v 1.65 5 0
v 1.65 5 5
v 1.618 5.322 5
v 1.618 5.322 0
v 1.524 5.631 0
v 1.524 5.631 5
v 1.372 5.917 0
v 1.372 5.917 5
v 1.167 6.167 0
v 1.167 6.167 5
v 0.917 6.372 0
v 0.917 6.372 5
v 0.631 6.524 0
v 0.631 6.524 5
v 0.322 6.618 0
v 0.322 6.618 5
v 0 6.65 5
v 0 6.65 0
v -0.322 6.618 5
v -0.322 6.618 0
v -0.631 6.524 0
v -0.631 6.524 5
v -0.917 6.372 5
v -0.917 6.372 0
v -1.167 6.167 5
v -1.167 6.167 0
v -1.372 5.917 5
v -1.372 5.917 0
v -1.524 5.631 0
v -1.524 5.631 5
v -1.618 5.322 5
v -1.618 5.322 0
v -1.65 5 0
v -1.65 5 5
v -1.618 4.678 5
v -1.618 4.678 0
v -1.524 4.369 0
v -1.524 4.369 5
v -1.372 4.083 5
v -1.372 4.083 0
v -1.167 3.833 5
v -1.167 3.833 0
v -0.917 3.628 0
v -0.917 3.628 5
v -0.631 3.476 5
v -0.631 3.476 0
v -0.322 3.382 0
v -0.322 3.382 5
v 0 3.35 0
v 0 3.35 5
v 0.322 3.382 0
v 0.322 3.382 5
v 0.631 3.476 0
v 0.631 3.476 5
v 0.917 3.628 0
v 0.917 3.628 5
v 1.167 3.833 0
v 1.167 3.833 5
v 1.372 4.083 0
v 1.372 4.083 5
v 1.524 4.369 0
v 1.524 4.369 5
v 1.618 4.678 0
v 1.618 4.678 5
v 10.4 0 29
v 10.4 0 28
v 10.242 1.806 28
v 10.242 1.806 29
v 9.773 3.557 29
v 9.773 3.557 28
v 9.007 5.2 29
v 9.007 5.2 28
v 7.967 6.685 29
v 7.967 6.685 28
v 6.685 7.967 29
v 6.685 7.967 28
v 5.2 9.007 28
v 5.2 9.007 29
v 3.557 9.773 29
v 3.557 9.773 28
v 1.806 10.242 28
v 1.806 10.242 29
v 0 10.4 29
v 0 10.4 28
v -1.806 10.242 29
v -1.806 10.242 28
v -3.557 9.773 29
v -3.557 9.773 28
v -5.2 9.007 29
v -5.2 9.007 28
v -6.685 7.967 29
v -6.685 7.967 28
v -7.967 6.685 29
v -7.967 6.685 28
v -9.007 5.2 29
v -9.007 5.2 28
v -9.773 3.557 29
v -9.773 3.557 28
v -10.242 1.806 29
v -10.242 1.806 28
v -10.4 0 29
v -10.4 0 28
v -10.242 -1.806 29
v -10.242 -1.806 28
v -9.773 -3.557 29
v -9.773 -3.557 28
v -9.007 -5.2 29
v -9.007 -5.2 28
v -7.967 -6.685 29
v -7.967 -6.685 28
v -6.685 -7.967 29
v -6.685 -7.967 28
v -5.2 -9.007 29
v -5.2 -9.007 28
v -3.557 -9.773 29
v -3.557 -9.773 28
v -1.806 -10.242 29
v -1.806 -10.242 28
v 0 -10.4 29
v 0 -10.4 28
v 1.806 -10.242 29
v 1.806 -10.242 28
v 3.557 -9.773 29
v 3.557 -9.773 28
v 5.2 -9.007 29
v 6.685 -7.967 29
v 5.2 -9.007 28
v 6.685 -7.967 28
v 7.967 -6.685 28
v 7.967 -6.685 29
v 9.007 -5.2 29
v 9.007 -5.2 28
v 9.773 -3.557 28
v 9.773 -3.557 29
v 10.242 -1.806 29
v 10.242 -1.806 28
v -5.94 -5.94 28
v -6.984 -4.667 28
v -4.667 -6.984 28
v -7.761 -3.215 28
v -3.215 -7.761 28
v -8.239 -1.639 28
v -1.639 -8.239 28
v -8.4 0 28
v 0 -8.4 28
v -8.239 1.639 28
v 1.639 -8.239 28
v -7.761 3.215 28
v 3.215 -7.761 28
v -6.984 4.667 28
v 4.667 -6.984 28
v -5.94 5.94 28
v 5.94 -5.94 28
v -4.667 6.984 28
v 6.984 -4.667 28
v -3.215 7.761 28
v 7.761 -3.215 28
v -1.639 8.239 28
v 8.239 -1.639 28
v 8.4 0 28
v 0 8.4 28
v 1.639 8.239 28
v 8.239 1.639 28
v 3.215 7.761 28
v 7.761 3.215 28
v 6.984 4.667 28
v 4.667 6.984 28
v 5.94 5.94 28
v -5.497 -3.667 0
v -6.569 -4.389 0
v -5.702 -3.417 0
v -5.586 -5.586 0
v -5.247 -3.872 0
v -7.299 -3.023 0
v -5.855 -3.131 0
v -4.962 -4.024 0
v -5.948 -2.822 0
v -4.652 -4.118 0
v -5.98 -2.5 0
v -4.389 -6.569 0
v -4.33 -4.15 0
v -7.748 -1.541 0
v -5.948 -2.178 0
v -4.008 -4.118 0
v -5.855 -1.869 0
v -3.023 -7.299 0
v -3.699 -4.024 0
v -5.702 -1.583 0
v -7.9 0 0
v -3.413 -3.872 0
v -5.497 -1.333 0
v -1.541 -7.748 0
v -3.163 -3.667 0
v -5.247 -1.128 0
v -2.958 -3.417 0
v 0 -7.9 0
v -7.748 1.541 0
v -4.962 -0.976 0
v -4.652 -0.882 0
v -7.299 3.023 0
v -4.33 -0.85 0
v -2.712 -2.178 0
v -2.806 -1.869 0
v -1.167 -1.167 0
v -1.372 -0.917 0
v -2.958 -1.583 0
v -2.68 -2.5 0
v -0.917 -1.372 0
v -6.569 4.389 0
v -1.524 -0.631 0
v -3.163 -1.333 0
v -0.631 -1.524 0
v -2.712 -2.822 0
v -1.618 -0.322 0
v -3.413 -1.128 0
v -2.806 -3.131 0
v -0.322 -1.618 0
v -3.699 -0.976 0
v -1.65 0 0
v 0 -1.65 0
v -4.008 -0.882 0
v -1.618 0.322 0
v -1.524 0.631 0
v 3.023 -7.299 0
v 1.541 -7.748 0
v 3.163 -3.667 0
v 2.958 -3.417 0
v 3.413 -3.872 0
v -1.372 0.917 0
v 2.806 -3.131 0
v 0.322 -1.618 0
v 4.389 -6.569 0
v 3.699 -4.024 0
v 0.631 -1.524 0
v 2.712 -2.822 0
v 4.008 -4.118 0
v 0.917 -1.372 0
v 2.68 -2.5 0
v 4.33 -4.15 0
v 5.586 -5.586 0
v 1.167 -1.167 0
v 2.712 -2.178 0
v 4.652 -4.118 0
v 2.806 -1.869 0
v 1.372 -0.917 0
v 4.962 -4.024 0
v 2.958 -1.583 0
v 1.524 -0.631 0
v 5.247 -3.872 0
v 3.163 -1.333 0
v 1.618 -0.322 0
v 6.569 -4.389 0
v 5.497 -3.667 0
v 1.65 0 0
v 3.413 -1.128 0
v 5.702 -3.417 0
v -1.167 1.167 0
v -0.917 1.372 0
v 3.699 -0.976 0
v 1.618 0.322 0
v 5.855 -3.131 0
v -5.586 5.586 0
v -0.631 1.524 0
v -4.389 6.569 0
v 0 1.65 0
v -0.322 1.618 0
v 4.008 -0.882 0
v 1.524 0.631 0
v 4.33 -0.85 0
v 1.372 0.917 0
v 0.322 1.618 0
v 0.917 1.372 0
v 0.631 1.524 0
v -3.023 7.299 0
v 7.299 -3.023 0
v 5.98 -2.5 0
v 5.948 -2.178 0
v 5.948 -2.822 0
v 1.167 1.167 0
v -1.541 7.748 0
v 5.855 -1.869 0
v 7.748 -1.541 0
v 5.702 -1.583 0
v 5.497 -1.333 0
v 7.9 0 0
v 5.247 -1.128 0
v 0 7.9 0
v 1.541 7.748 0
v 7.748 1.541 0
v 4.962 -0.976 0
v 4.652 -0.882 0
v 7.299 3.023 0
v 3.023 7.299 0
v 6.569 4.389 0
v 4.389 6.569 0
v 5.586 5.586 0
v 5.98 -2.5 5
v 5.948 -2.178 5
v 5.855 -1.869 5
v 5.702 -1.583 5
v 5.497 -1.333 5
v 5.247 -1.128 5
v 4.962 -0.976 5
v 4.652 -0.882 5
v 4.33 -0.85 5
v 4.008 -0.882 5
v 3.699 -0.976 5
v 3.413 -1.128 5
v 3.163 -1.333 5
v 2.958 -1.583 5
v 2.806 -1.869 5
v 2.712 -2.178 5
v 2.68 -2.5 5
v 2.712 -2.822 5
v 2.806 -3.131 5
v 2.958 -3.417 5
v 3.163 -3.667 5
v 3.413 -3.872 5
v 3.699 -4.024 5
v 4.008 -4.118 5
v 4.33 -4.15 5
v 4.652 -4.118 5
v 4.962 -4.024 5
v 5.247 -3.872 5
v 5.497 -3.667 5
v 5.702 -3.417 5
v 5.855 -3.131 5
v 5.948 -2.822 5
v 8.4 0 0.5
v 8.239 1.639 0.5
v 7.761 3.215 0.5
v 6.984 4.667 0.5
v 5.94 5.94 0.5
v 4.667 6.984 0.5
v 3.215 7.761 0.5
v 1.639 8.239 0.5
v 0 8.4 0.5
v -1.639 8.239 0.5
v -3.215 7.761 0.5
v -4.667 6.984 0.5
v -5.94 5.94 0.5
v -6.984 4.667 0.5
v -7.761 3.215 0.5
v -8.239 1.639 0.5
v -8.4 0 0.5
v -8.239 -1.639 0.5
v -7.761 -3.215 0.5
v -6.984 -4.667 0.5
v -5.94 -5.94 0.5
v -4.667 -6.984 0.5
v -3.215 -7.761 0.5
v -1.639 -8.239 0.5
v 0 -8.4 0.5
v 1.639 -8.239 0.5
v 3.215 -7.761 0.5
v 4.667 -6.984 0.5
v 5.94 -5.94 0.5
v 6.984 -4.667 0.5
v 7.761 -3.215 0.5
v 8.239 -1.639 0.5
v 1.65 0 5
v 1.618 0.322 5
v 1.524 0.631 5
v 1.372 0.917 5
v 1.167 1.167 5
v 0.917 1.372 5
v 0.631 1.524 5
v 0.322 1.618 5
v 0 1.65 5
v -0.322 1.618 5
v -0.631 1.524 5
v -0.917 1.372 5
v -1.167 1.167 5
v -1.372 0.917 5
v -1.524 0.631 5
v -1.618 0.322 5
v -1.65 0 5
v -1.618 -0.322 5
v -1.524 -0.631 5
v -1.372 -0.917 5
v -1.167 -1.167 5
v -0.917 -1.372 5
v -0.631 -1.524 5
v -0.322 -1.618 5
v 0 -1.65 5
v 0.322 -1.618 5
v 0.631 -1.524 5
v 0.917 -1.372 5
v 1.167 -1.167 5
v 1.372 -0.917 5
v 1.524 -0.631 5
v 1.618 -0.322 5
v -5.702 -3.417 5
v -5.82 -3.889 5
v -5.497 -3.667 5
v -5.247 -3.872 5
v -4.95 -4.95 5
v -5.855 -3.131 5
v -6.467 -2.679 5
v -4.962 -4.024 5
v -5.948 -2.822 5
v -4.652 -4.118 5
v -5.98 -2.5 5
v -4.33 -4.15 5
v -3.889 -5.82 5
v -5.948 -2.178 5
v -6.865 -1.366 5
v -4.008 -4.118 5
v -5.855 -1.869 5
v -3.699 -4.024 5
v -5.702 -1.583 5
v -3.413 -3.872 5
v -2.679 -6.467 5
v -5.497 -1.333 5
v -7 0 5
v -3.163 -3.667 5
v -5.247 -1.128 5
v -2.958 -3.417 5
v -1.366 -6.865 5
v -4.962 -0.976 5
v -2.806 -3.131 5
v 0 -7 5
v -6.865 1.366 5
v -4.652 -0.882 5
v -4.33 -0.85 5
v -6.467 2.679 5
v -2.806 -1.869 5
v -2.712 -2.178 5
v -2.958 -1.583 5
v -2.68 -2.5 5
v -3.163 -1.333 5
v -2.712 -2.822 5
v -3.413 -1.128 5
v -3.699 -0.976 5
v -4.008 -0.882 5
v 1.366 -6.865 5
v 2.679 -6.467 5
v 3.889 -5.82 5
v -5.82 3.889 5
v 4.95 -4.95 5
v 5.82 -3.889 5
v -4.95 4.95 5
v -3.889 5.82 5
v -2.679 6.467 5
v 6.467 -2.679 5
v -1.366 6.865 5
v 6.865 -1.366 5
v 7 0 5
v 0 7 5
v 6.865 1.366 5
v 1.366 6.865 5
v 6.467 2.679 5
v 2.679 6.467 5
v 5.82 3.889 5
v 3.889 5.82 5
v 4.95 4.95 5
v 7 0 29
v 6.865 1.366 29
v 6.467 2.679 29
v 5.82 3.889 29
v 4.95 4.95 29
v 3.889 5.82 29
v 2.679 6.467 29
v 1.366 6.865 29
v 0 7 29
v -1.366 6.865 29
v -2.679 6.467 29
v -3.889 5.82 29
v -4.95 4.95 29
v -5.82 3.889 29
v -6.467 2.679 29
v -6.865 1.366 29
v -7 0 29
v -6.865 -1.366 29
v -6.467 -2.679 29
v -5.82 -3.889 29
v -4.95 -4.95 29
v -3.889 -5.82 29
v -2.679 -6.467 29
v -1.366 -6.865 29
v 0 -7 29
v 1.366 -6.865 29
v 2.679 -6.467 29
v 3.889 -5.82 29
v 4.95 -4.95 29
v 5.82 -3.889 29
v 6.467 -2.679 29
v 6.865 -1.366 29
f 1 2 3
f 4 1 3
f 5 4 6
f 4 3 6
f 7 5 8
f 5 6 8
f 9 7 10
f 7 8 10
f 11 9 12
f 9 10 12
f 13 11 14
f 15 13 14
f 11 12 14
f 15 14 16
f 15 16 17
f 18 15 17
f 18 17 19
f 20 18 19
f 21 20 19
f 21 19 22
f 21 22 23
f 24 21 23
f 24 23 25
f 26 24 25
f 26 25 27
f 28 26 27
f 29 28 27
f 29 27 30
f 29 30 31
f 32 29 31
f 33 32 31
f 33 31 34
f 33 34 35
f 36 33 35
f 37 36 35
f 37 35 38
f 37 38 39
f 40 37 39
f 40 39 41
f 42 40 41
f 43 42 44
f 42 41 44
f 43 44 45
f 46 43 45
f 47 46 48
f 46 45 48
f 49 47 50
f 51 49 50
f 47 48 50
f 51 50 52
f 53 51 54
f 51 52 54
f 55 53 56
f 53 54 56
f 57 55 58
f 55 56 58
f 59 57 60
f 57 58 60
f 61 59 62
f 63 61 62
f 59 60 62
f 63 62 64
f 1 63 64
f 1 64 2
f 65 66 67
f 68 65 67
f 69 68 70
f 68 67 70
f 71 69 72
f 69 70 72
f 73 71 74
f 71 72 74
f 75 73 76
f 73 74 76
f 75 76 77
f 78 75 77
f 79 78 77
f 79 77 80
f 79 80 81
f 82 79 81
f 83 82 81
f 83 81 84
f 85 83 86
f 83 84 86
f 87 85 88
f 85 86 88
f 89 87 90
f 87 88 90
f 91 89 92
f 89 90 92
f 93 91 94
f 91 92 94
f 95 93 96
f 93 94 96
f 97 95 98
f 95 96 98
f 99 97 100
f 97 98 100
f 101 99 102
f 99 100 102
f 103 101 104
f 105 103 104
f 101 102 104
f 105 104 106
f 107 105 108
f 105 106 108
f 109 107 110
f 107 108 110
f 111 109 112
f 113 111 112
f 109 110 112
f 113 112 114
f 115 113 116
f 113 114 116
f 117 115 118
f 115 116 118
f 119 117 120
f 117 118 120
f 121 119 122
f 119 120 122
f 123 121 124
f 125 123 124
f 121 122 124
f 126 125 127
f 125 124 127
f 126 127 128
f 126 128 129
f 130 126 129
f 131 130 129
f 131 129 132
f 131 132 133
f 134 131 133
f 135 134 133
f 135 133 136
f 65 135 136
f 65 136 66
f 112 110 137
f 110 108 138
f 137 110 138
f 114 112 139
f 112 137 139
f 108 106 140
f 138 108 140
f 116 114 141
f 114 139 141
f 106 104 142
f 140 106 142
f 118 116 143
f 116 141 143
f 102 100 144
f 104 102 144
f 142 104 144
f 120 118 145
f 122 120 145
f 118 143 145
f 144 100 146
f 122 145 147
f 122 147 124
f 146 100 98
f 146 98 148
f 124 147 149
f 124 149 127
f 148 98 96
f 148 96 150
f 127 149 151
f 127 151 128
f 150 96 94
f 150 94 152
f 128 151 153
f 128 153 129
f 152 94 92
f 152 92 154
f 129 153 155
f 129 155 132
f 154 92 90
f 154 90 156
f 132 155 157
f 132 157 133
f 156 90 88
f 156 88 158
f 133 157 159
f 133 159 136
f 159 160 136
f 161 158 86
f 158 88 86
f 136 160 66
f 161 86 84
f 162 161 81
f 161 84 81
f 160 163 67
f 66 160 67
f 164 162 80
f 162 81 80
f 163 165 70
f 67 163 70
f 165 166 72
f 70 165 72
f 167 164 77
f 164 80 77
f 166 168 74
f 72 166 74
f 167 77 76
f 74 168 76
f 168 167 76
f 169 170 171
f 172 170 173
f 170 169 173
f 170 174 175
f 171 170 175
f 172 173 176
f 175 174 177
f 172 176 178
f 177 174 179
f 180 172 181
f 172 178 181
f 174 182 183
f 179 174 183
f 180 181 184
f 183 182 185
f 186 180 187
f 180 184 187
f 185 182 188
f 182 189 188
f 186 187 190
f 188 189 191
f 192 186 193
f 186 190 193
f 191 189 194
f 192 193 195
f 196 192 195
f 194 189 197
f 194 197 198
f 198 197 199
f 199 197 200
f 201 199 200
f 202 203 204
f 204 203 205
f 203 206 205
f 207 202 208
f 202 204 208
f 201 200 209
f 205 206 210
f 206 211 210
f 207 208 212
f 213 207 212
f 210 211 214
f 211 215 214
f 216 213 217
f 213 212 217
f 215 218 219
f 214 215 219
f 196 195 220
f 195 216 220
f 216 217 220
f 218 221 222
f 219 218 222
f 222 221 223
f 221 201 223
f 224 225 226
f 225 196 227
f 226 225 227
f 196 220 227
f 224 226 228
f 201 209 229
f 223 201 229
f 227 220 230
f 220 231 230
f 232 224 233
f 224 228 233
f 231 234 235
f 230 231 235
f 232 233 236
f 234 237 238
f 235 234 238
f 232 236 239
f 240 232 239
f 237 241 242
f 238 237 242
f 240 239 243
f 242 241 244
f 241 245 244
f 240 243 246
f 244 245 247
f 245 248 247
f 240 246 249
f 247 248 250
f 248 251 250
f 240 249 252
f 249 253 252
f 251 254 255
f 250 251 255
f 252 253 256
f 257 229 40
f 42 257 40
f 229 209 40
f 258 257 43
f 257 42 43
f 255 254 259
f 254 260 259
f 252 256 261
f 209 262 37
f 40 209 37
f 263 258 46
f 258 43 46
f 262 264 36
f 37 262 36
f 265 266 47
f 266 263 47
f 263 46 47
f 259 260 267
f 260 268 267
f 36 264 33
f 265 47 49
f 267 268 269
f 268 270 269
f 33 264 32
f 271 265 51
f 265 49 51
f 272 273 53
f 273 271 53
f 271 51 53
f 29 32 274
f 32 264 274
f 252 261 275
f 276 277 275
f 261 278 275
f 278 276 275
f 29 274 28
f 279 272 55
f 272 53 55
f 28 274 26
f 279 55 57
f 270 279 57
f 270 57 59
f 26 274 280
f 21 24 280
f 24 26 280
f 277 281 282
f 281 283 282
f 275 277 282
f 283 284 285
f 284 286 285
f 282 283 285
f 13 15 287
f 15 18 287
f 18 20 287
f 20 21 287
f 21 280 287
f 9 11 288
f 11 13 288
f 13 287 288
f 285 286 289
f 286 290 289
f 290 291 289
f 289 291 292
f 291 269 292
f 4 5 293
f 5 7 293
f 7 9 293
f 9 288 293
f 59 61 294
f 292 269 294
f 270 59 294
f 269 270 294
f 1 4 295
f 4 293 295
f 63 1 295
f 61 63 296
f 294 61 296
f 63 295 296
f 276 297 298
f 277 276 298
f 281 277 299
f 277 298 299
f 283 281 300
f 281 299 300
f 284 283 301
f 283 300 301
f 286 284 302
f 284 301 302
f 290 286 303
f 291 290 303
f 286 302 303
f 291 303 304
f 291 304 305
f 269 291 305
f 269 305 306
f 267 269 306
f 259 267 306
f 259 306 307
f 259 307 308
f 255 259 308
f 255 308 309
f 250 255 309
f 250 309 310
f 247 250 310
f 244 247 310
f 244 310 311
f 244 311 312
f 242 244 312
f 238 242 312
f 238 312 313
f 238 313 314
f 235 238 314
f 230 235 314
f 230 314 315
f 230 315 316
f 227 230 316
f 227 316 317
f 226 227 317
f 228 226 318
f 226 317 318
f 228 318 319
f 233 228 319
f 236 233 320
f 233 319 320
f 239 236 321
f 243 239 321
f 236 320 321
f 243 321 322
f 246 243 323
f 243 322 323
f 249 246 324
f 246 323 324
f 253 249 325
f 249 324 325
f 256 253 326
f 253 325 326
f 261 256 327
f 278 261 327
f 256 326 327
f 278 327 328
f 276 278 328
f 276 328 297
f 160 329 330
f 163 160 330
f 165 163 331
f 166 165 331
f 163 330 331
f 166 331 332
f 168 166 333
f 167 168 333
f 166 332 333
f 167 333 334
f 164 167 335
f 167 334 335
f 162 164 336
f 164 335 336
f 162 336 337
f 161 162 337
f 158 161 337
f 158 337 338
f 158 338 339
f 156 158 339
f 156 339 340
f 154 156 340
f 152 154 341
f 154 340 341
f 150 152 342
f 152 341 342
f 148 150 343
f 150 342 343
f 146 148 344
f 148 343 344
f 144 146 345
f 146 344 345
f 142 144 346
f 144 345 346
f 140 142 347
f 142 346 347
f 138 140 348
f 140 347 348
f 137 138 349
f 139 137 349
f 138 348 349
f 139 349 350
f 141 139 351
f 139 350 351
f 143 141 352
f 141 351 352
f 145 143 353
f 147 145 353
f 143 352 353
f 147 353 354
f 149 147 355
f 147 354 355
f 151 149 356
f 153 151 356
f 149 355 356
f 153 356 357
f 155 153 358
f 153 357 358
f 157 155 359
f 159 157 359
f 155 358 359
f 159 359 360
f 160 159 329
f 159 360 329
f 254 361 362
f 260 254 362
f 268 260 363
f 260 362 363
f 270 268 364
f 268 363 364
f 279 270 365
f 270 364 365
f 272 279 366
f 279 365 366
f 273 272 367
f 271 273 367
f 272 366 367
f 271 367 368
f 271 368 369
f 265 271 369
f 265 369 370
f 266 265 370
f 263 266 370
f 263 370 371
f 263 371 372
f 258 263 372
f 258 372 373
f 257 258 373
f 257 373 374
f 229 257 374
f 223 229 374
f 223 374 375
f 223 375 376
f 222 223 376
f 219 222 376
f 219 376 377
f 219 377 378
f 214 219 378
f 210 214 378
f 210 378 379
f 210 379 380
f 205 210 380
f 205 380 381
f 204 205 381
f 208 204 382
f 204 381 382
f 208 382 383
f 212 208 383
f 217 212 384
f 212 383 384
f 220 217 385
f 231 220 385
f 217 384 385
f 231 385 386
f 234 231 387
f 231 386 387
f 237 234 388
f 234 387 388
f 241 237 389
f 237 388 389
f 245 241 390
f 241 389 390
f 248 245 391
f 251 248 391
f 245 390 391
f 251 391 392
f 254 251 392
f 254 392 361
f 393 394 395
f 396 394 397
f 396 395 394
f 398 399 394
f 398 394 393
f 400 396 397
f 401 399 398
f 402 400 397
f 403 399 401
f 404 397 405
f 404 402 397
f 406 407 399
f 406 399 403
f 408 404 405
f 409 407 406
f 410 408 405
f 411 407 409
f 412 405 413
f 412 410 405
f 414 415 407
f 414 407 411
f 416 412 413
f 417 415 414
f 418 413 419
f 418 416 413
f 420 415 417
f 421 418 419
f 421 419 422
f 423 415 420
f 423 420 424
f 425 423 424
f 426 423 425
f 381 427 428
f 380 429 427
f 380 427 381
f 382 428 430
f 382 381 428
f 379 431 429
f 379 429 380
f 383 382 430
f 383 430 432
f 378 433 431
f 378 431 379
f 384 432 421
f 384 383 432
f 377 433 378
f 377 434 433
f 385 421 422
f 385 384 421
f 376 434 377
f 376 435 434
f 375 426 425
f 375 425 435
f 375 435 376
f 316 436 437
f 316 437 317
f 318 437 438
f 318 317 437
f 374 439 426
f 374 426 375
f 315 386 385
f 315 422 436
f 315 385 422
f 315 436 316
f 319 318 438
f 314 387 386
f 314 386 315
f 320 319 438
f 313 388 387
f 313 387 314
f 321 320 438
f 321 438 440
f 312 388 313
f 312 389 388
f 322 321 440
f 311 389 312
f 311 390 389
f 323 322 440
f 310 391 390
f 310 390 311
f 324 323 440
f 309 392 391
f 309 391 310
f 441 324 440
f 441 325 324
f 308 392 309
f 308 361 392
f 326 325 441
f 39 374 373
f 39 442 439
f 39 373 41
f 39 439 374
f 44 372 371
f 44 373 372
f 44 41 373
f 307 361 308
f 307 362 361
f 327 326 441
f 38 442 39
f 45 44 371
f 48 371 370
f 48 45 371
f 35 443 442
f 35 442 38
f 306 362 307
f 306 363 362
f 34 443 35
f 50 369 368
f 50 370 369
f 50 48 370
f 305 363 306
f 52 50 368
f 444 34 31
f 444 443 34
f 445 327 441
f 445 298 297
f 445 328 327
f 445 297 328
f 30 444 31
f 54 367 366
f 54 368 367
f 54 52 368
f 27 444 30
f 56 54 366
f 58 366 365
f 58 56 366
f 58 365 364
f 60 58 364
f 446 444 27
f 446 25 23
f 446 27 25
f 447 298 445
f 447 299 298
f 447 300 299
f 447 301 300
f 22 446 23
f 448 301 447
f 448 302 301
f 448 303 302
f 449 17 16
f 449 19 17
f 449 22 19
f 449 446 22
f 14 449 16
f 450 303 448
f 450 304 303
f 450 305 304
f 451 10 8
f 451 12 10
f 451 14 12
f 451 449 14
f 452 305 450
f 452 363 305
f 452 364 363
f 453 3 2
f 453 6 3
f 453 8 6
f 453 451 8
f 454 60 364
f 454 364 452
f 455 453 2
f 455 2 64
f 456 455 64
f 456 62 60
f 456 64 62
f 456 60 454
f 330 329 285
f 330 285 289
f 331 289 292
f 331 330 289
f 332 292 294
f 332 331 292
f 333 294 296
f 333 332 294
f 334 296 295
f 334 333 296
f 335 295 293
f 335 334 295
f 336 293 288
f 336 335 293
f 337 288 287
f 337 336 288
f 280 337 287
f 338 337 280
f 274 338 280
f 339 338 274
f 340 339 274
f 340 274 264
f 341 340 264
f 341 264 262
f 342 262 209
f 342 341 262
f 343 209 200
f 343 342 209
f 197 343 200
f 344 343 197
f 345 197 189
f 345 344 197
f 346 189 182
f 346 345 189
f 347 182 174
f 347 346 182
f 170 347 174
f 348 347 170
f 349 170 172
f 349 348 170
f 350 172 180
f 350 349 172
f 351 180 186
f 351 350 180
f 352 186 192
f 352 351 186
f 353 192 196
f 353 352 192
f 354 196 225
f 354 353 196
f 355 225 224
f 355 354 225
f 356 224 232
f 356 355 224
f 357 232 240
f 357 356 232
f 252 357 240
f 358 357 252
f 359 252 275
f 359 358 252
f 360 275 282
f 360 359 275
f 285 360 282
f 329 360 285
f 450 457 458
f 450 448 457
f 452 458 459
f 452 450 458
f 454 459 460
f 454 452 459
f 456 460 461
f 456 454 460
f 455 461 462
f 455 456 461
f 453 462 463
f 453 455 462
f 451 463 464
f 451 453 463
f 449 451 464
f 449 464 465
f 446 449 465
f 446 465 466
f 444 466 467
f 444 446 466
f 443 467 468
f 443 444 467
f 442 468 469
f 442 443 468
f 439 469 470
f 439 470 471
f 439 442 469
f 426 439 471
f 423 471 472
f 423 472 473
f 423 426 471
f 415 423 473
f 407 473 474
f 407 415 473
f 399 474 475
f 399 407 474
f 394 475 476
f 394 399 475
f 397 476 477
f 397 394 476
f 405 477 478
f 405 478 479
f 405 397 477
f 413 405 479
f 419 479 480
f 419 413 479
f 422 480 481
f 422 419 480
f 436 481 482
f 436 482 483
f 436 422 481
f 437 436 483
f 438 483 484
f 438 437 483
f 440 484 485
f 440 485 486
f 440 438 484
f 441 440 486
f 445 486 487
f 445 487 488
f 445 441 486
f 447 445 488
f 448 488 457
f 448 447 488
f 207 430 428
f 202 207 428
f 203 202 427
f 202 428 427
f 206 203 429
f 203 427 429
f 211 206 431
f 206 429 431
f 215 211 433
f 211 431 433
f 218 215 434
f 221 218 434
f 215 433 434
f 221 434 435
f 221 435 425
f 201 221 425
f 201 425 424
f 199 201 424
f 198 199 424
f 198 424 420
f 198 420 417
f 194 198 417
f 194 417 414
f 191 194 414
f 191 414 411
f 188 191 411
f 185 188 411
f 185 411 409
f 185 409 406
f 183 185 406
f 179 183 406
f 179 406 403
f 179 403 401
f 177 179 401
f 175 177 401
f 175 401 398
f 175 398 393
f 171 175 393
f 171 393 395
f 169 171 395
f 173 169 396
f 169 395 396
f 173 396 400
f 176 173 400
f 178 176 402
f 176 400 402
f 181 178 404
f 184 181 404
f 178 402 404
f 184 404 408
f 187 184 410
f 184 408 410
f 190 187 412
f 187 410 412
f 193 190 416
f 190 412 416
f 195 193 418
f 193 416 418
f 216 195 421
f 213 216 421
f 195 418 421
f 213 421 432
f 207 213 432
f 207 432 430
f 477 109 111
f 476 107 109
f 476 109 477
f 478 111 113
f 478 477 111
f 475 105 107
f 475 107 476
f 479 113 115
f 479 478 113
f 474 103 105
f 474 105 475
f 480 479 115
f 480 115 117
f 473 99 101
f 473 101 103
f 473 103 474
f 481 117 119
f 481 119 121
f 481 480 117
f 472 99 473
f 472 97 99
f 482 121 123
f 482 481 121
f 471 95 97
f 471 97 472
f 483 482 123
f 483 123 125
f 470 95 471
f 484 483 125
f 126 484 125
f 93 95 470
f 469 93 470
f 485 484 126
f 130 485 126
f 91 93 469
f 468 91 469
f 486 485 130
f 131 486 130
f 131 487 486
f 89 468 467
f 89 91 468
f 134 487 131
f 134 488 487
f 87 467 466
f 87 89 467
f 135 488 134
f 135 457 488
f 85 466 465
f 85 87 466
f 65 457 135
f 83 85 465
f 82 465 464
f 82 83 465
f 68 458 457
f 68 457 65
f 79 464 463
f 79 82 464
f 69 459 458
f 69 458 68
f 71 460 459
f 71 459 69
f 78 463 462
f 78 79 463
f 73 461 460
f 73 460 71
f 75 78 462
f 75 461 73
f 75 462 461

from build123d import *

# Parameters (mm, degrees)
SKETCH_1_R          = 8.4
EXTRUDE_1_DEPTH     = 28
SKETCH_2_R          = 7
CUT_EXTRUDE_3_DEPTH = 23
HOLE_WIZARD_M4_1_D  = 3.3
SKETCH_10_R         = 10.4
SKETCH_10_R_2       = 8.4
SKETCH_10_R_3       = 7
EXTRUDE_4_DEPTH     = 1
CHAMFER_1_SIZE      = 0.5


with BuildPart() as part:
    # 草图1 → 凸台-拉伸1 (new body)
    with BuildSketch(Plane.XY):
        Circle(SKETCH_1_R)
    extrude(amount=EXTRUDE_1_DEPTH)

    # 草图2 → 切除-拉伸3 (cut)
    with BuildSketch(Plane.XY.offset(28)):
        Circle(SKETCH_2_R)
    extrude(amount=-CUT_EXTRUDE_3_DEPTH, mode=Mode.SUBTRACT)

    # M4 螺纹孔1 (through all)
    with Locations(Plane(origin=(0, 0, 0), x_dir=(-1, 0, 0), z_dir=(0, 0, -1))):
        with Locations((0, 5), (0, 0), (-4.330127019, -2.5), (4.330127019, -2.5)):
            Hole(HOLE_WIZARD_M4_1_D / 2)

    # 草图10 → 凸台-拉伸4 (add)
    # profile 1 of 2: a face of its own
    with BuildSketch(Plane.XY.offset(28)):
        Circle(SKETCH_10_R)
        Circle(SKETCH_10_R_2, mode=Mode.SUBTRACT)
    # profile 2 of 2: a face of its own
    with BuildSketch(Plane.XY.offset(28)):
        Circle(SKETCH_10_R_2)
        Circle(SKETCH_10_R_3, mode=Mode.SUBTRACT)
    extrude(amount=EXTRUDE_4_DEPTH)

    # 倒角1
    chamfer_1_edges = [part.edges().sort_by_distance(p)[0] for p in [
        (-8.4, 0, 0),
    ]]
    chamfer(chamfer_1_edges, length=CHAMFER_1_SIZE)


solid = part.part
